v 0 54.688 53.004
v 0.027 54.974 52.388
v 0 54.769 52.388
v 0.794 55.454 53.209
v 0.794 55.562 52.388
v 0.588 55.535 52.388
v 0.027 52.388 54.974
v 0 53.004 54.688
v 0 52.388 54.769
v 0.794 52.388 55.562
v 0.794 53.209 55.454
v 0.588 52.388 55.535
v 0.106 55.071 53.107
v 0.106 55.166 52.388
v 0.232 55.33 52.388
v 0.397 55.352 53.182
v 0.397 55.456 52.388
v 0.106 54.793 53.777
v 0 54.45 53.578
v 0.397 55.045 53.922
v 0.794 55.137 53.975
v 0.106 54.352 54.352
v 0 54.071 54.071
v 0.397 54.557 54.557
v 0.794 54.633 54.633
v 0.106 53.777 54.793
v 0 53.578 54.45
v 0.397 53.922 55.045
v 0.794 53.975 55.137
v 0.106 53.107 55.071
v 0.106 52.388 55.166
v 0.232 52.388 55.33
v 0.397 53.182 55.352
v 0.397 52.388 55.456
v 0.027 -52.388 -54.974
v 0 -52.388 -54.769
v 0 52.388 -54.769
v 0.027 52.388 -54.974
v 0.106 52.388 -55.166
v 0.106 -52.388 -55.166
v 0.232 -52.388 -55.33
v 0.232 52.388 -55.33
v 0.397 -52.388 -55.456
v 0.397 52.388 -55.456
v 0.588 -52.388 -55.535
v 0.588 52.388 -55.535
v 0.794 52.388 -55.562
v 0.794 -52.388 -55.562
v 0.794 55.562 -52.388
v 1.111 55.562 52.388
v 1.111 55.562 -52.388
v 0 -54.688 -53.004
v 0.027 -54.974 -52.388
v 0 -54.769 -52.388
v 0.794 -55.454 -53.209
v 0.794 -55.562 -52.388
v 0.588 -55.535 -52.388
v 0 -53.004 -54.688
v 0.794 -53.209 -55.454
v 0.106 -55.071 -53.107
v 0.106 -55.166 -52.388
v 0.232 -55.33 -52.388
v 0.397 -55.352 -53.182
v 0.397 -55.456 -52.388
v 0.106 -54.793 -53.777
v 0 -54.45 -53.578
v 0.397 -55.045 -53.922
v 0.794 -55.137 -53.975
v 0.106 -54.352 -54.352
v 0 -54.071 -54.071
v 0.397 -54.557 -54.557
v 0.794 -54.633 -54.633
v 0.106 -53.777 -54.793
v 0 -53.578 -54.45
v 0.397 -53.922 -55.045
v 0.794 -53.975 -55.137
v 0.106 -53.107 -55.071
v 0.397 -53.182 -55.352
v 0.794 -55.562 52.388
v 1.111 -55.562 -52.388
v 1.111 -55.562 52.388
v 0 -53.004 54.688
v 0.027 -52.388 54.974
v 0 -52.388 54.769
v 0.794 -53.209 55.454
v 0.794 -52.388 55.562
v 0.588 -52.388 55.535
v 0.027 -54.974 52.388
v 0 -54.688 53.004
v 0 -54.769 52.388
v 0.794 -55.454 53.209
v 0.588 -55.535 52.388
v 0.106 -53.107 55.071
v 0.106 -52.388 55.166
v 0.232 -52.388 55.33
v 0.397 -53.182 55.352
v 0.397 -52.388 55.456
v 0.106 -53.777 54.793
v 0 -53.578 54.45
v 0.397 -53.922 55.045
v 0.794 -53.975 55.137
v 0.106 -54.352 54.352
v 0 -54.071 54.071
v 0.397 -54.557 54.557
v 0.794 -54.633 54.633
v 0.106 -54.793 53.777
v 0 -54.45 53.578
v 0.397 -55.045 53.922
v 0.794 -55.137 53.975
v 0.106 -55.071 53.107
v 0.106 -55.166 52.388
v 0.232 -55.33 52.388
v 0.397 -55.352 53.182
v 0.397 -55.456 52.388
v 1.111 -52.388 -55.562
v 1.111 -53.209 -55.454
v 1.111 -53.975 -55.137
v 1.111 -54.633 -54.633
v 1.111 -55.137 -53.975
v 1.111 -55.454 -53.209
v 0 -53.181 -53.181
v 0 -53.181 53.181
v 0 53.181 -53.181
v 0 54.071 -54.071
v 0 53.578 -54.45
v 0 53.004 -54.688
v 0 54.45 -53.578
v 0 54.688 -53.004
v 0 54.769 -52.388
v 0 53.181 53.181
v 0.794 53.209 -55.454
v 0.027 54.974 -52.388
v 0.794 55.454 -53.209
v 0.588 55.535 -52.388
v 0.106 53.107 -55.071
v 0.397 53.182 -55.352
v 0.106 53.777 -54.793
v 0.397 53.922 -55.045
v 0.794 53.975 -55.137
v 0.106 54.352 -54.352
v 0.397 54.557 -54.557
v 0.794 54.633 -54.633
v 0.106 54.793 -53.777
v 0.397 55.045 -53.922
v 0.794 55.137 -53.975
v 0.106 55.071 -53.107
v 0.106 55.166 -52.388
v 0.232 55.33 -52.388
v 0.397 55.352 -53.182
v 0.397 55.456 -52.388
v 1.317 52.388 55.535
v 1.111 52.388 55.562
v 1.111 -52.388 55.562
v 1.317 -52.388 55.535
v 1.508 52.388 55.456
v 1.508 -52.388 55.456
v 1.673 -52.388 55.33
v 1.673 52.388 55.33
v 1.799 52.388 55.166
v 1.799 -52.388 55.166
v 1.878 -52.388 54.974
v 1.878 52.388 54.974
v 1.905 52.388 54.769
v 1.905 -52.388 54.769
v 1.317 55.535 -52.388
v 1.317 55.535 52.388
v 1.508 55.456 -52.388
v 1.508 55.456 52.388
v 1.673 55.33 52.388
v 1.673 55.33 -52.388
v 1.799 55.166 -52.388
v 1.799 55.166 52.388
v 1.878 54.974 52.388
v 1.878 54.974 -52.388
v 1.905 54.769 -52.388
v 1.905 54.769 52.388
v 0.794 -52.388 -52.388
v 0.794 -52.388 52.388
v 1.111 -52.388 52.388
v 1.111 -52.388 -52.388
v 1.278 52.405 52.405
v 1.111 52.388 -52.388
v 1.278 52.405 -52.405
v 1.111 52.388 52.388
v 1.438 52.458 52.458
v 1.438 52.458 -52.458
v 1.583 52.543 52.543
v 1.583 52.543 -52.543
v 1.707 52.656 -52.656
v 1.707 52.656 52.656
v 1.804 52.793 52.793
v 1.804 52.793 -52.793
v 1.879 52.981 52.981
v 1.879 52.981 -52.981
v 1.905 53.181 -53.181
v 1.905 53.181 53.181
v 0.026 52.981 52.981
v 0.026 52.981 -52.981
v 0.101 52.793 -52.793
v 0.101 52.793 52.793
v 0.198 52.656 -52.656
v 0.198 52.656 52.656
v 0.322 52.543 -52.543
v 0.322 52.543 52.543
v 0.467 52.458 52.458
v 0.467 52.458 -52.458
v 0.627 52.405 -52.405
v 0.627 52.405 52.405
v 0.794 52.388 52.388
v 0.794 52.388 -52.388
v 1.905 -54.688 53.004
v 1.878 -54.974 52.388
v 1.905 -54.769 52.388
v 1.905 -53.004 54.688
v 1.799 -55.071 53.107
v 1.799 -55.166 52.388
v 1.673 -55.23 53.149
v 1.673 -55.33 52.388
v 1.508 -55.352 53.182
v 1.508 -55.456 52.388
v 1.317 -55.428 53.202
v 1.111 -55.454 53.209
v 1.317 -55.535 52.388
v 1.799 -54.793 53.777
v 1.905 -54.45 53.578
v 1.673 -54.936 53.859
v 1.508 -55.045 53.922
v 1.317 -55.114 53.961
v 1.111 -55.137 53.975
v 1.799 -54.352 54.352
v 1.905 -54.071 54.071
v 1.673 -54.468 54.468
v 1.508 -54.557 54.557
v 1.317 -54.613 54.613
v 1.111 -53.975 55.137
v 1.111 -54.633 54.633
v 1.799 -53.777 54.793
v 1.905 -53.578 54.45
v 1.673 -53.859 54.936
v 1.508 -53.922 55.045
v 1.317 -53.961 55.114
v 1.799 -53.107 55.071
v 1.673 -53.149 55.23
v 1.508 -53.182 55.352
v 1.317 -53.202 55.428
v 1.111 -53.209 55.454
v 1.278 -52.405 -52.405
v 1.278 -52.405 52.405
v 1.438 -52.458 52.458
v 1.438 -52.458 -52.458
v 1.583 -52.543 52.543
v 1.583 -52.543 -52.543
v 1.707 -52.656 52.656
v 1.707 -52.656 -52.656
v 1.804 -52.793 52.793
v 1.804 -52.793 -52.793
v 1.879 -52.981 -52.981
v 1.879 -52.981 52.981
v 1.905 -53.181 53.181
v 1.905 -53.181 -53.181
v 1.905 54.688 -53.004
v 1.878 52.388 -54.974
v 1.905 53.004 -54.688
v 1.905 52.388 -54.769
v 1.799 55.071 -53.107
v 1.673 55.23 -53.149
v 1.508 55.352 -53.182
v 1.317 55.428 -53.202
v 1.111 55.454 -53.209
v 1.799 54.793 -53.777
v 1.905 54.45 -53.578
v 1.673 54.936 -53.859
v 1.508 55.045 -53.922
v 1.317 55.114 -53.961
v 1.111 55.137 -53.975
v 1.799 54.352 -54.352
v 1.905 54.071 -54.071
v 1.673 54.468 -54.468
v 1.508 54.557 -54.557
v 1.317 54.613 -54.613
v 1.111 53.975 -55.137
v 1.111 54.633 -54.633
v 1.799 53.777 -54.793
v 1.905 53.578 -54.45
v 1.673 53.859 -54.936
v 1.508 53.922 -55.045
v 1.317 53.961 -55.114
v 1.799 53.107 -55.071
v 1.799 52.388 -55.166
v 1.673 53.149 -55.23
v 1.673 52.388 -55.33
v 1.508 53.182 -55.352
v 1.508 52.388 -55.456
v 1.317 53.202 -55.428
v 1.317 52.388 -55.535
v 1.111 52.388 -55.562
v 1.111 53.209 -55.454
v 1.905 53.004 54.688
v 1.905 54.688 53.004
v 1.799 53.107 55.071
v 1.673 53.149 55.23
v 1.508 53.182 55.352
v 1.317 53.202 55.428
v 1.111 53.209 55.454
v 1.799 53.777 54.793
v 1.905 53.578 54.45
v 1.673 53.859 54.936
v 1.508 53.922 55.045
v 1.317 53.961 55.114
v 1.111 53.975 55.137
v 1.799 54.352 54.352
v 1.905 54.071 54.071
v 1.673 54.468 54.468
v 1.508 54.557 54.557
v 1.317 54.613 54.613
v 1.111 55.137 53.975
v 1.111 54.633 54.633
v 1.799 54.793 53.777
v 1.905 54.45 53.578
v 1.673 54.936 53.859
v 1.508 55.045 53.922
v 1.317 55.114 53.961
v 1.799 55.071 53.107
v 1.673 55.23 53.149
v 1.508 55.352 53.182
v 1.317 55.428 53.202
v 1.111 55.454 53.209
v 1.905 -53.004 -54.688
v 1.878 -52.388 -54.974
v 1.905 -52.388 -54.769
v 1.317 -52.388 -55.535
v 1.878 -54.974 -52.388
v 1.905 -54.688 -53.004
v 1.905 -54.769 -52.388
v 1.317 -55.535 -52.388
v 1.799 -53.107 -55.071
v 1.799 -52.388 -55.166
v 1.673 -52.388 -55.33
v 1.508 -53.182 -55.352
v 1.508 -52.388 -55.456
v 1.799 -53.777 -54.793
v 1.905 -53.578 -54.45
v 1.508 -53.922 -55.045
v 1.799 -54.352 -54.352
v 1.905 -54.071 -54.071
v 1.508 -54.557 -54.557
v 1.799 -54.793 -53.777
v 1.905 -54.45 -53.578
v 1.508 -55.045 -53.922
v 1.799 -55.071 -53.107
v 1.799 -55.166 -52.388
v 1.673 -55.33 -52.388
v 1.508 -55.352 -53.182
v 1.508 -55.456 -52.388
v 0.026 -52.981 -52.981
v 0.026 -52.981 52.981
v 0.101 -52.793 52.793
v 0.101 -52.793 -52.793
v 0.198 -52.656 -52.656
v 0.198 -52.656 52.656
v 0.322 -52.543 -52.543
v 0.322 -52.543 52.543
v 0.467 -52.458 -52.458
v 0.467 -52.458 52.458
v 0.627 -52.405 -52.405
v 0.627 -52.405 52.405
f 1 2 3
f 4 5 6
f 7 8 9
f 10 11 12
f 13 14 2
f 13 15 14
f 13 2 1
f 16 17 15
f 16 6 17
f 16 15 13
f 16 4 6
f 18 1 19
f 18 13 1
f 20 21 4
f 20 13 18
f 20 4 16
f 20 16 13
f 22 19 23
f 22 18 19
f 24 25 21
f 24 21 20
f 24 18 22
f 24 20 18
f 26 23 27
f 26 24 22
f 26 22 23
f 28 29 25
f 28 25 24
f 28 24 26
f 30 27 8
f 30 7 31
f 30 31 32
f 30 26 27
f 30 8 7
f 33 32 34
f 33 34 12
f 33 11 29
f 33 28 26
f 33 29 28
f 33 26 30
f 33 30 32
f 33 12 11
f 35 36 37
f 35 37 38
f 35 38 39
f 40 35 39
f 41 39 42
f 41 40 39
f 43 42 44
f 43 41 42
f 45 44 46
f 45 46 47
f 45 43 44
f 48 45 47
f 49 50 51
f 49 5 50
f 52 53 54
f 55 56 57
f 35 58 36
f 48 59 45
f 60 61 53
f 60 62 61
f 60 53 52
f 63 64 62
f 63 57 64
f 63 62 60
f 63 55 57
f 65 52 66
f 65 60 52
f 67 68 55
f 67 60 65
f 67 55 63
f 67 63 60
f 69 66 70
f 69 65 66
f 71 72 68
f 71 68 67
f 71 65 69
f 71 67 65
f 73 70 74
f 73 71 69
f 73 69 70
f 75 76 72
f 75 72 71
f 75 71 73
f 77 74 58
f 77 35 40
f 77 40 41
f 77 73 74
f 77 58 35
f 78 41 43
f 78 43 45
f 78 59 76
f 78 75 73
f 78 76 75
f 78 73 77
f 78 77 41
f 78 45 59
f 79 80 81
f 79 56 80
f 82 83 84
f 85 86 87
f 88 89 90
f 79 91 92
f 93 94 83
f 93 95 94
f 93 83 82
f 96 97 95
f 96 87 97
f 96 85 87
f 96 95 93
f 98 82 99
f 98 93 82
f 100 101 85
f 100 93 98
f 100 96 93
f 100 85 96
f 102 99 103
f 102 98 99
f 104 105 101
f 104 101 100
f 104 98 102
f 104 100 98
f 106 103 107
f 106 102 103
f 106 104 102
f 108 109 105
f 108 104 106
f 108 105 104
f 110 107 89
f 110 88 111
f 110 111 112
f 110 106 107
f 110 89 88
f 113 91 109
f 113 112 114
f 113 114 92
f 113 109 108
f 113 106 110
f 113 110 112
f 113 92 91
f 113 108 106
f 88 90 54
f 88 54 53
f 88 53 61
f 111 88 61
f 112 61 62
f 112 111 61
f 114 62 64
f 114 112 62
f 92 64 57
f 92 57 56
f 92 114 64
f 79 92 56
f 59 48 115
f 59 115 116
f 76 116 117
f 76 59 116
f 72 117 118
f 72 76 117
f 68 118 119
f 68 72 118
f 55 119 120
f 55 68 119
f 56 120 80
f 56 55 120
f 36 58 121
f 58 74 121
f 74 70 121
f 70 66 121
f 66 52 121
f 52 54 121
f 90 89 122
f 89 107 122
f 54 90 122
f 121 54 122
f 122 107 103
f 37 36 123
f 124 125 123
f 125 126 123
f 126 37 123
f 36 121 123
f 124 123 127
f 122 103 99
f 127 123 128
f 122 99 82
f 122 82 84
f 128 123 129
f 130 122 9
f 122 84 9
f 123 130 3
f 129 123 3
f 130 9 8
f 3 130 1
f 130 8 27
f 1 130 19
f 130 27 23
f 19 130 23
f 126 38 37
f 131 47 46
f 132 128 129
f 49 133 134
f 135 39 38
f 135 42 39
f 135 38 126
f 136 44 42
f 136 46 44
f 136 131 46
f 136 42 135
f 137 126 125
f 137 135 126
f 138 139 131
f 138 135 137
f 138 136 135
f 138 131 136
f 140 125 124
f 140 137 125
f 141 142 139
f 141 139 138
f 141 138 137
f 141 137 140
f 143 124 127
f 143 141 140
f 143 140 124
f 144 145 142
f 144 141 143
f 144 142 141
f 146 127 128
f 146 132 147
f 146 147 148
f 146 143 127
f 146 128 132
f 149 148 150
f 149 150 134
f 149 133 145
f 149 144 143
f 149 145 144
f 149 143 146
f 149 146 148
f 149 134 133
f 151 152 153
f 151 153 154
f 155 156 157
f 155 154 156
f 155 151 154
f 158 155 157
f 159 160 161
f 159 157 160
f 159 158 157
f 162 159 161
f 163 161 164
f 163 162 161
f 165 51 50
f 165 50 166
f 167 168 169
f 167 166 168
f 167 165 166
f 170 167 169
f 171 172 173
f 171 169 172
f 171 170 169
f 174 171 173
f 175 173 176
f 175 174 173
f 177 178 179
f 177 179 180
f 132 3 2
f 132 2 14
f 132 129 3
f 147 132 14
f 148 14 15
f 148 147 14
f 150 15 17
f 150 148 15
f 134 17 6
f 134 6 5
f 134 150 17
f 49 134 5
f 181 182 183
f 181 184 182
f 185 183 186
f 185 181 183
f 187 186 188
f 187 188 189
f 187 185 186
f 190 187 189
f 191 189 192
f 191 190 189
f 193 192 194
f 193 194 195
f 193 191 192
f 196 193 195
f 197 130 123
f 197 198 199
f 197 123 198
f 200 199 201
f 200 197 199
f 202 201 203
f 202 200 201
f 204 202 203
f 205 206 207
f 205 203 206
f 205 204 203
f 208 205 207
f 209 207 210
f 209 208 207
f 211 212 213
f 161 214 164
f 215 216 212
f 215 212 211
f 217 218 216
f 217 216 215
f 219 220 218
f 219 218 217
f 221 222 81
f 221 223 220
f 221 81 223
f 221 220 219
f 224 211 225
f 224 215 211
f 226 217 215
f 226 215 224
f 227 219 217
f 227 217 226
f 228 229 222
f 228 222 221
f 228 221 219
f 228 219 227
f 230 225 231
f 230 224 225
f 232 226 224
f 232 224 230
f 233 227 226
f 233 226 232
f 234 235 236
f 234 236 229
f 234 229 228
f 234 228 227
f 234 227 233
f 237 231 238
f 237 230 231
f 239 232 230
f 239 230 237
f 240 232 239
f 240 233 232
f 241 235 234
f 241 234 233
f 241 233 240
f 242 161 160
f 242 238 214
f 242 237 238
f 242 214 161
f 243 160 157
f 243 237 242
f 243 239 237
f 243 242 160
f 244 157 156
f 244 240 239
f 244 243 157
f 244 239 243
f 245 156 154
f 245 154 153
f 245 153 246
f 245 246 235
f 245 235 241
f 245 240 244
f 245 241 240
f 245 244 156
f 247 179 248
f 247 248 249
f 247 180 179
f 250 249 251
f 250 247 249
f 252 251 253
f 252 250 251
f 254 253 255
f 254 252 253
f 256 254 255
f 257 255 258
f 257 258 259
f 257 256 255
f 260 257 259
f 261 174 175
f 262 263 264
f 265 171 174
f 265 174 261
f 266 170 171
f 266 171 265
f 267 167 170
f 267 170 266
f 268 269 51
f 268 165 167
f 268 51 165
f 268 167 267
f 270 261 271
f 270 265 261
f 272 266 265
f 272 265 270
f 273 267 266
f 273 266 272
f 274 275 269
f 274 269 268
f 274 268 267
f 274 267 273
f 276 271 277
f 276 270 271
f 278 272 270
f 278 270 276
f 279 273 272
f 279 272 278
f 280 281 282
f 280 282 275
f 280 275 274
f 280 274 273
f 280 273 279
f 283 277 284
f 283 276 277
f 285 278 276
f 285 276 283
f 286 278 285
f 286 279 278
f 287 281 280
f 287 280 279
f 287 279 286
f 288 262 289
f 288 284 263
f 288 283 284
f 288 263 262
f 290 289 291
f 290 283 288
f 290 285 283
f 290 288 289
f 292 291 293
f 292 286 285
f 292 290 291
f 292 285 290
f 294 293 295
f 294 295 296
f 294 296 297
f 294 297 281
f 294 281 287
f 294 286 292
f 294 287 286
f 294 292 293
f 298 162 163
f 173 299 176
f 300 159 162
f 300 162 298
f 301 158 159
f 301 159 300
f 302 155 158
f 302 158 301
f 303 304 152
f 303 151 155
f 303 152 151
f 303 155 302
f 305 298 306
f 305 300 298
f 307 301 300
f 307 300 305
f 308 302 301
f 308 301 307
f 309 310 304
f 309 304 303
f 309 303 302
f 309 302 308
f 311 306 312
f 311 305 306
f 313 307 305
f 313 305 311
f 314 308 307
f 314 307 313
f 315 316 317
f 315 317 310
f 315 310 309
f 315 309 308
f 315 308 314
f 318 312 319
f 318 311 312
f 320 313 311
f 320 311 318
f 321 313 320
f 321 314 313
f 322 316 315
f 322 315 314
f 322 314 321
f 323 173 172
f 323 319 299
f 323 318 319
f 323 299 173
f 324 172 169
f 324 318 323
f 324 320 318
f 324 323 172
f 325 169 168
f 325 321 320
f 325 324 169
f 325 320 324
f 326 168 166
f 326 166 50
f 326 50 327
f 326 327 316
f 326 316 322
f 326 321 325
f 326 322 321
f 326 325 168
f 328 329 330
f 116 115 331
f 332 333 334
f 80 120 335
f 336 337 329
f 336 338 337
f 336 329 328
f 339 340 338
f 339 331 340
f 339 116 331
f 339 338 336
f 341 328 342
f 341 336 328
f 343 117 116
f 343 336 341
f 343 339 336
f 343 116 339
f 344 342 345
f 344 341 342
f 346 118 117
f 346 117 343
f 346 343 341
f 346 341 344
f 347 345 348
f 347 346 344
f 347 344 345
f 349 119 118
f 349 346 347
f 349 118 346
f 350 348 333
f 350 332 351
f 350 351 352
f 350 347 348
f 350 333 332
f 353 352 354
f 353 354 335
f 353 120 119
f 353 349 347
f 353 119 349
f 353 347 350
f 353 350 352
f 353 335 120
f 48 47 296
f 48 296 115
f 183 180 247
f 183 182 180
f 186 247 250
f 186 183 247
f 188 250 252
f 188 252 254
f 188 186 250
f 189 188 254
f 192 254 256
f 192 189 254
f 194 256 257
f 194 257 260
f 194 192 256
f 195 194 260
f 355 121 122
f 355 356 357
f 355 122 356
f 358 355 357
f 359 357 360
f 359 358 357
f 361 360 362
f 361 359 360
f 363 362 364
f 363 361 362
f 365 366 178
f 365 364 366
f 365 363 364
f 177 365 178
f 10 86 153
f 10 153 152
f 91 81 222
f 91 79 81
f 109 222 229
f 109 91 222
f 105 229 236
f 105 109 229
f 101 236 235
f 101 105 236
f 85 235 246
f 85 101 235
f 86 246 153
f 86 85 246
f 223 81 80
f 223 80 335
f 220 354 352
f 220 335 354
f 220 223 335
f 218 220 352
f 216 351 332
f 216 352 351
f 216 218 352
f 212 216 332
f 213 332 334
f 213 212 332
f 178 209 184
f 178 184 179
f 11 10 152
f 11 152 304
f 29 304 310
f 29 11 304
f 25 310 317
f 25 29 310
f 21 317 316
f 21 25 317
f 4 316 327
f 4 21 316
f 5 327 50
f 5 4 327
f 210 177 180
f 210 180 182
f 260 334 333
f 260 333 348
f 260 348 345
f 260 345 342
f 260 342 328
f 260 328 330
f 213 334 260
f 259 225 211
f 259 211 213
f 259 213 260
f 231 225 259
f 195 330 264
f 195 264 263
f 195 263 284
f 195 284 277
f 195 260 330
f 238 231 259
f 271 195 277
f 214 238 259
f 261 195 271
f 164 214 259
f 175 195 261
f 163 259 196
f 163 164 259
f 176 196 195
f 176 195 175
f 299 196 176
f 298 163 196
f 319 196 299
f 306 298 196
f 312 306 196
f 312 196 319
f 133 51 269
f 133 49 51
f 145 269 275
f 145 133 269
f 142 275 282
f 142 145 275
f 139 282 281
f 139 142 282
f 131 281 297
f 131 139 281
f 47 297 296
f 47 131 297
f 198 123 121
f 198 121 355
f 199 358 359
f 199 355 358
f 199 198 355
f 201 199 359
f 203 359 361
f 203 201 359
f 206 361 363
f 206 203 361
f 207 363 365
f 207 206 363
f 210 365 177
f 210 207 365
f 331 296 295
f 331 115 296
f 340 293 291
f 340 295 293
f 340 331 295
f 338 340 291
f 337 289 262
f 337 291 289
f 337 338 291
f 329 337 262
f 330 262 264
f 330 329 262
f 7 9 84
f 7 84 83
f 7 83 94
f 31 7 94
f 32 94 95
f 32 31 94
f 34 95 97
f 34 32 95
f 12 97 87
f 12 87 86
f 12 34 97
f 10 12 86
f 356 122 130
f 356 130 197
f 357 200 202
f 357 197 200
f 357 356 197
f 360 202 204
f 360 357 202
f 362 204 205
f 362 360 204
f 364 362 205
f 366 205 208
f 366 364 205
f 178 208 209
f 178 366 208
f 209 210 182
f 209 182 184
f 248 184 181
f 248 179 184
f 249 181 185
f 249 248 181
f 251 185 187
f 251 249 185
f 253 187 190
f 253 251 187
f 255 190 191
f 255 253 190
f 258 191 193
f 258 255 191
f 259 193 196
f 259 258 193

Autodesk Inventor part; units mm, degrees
ref_plane "YZ Plane" through (0, 0, 0) normal (1, 0, 0) x (0, 1, 0)
ref_plane "XZ Plane" through (0, 0, 0) normal (0, 1, 0) x (-1, 0, 0)
ref_plane "XY Plane" through (0, 0, 0) normal (0, 0, 1) x (1, 0, 0)
sketch "Sketch1" plane through (0, 0, 0) normal (1, 0, 0) x (0, 1, 0)
  line L0 (-52.3875, -52.3875) -> (52.3875, -52.3875)
  line L1 (52.3875, -52.3875) -> (52.3875, 52.3875)
  line L2 (52.3875, 52.3875) -> (-52.3875, 52.3875)
  line L3 (-52.3875, 52.3875) -> (-52.3875, -52.3875)
  line L4 (-52.3875, -52.3875) -> (52.3875, 52.3875) construction
  line L5 (52.3875, -52.3875) -> (-52.3875, 52.3875) construction
  line L6 (-55.5625, 55.5625) -> (55.5625, 55.5625)
  line L7 (55.5625, 55.5625) -> (55.5625, -55.5625)
  line L8 (55.5625, -55.5625) -> (-55.5625, -55.5625)
  line L9 (-55.5625, -55.5625) -> (-55.5625, 55.5625)
  point P0 (0, 0)
  dimension "d0" = 104.775
  dimension "d1" = 104.775
  dimension "d2" = 3.175
extrude "Extrusion1" add sketch "Sketch1" along normal blind 1.905
fillet "Fillet1" radius 0.7937 16 edges at (1.905, 0, 55.5625) (0, 0, 55.5625) (1.905, 0, 52.3875) (0, 0, 52.3875) (1.905, 52.3875, 0) (1.905, 55.5625, 0) (0, 52.3875, 0) (0, 55.5625, 0) (1.905, 0, -55.5625) (1.905, 0, -52.3875) (0, 0, -55.5625) (0, 0, -52.3875) (0, -52.3875, 0) (1.905, -52.3875, 0) (0, -55.5625, 0) (1.905, -55.5625, 0)
fillet "Fillet2" radius 3.175 12 edges at (0.9525, 55.5625, 55.5625) (0.2325, 55.33, 55.33) (1.6725, 55.33, 55.33) (0.9525, -55.5625, 55.5625) (0.2325, -55.33, 55.33) (1.6725, -55.33, 55.33) (1.6725, -55.33, -55.33) (0.2325, -55.33, -55.33) (0.9525, -55.5625, -55.5625) (0.9525, 55.5625, -55.5625) (0.2325, 55.33, -55.33) (1.6725, 55.33, -55.33)
equation "\"d0\" = 0.25 * frontBackORingID"
equation "\"d1\" = 0.25 * frontBackORingID"
equation "\"d2\" = oRingWidth"
equation "\"d5\" = 0.25 * oRingWidth"
equation "\"d6\" = oRingWidth"
equation "\"acrylicThickness\" = 6.35"
equation "\"height\" = 101.6"
equation "\"width\" = 101.6"
equation "\"depth\" = 101.6"
equation "\"mirrorAngle\" = 5deg"
equation "\"detectorWidth\" = 52"
equation "\"detectorHeight\" = 52"
equation "\"mirrorThickness\" = 3"
equation "\"fresnelThickness\" = 0.1"
equation "\"focalLength\" = 76.2"
equation "\"ior\" = 1.49"
equation "\"centerThickness\" = 1.524"
equation "\"fresnelAngle\" = 90deg"
equation "\"fresnelEffectiveDiameter\" = 76.2"
equation "\"mirrorSuppourtWidth\" = 38.1"
equation "\"backGrooveBit\" = 4.8006"
equation "\"sensorHolderWidth\" = 88.9"
equation "\"sensorHolderHeight\" = 88.9"
equation "\"sensorHolderSensorHeight\" = 53.975"
equation "\"sensorHolderSensorWidth\" = 53.975"
equation "\"oRingWidth\" = 3.175"
equation "\"sensorHolderORingID\" = 203.2"
equation "\"sensorHolderFlushORingID\" = 304.8"
equation "\"frontBackORingID\" = 419.1"
equation "\"topBottomHorizontalMirrorGroove\" = 12.7"
equation "\"backMirrorGroove\" = 6.35"
equation "\"mirrorGroove\" = 19.05"
equation "\"fresnelChamfer\" = 6.35"
equation "\"mirrorGrooveFillet\" = 6.35"
equation "\"mirrorGrooveDrill\" = 6.35"
equation "\"mirrorGrooveMill\" = 3.175"
equation "\"fresnelMirrorChamfer\" = 6.35"
equation "\"detectorOpeningHeight\" = 76.2"
equation "\"detectorOpeningWidth\" = 76.2"
properties part number "frontBackORing" material "Rubber"
